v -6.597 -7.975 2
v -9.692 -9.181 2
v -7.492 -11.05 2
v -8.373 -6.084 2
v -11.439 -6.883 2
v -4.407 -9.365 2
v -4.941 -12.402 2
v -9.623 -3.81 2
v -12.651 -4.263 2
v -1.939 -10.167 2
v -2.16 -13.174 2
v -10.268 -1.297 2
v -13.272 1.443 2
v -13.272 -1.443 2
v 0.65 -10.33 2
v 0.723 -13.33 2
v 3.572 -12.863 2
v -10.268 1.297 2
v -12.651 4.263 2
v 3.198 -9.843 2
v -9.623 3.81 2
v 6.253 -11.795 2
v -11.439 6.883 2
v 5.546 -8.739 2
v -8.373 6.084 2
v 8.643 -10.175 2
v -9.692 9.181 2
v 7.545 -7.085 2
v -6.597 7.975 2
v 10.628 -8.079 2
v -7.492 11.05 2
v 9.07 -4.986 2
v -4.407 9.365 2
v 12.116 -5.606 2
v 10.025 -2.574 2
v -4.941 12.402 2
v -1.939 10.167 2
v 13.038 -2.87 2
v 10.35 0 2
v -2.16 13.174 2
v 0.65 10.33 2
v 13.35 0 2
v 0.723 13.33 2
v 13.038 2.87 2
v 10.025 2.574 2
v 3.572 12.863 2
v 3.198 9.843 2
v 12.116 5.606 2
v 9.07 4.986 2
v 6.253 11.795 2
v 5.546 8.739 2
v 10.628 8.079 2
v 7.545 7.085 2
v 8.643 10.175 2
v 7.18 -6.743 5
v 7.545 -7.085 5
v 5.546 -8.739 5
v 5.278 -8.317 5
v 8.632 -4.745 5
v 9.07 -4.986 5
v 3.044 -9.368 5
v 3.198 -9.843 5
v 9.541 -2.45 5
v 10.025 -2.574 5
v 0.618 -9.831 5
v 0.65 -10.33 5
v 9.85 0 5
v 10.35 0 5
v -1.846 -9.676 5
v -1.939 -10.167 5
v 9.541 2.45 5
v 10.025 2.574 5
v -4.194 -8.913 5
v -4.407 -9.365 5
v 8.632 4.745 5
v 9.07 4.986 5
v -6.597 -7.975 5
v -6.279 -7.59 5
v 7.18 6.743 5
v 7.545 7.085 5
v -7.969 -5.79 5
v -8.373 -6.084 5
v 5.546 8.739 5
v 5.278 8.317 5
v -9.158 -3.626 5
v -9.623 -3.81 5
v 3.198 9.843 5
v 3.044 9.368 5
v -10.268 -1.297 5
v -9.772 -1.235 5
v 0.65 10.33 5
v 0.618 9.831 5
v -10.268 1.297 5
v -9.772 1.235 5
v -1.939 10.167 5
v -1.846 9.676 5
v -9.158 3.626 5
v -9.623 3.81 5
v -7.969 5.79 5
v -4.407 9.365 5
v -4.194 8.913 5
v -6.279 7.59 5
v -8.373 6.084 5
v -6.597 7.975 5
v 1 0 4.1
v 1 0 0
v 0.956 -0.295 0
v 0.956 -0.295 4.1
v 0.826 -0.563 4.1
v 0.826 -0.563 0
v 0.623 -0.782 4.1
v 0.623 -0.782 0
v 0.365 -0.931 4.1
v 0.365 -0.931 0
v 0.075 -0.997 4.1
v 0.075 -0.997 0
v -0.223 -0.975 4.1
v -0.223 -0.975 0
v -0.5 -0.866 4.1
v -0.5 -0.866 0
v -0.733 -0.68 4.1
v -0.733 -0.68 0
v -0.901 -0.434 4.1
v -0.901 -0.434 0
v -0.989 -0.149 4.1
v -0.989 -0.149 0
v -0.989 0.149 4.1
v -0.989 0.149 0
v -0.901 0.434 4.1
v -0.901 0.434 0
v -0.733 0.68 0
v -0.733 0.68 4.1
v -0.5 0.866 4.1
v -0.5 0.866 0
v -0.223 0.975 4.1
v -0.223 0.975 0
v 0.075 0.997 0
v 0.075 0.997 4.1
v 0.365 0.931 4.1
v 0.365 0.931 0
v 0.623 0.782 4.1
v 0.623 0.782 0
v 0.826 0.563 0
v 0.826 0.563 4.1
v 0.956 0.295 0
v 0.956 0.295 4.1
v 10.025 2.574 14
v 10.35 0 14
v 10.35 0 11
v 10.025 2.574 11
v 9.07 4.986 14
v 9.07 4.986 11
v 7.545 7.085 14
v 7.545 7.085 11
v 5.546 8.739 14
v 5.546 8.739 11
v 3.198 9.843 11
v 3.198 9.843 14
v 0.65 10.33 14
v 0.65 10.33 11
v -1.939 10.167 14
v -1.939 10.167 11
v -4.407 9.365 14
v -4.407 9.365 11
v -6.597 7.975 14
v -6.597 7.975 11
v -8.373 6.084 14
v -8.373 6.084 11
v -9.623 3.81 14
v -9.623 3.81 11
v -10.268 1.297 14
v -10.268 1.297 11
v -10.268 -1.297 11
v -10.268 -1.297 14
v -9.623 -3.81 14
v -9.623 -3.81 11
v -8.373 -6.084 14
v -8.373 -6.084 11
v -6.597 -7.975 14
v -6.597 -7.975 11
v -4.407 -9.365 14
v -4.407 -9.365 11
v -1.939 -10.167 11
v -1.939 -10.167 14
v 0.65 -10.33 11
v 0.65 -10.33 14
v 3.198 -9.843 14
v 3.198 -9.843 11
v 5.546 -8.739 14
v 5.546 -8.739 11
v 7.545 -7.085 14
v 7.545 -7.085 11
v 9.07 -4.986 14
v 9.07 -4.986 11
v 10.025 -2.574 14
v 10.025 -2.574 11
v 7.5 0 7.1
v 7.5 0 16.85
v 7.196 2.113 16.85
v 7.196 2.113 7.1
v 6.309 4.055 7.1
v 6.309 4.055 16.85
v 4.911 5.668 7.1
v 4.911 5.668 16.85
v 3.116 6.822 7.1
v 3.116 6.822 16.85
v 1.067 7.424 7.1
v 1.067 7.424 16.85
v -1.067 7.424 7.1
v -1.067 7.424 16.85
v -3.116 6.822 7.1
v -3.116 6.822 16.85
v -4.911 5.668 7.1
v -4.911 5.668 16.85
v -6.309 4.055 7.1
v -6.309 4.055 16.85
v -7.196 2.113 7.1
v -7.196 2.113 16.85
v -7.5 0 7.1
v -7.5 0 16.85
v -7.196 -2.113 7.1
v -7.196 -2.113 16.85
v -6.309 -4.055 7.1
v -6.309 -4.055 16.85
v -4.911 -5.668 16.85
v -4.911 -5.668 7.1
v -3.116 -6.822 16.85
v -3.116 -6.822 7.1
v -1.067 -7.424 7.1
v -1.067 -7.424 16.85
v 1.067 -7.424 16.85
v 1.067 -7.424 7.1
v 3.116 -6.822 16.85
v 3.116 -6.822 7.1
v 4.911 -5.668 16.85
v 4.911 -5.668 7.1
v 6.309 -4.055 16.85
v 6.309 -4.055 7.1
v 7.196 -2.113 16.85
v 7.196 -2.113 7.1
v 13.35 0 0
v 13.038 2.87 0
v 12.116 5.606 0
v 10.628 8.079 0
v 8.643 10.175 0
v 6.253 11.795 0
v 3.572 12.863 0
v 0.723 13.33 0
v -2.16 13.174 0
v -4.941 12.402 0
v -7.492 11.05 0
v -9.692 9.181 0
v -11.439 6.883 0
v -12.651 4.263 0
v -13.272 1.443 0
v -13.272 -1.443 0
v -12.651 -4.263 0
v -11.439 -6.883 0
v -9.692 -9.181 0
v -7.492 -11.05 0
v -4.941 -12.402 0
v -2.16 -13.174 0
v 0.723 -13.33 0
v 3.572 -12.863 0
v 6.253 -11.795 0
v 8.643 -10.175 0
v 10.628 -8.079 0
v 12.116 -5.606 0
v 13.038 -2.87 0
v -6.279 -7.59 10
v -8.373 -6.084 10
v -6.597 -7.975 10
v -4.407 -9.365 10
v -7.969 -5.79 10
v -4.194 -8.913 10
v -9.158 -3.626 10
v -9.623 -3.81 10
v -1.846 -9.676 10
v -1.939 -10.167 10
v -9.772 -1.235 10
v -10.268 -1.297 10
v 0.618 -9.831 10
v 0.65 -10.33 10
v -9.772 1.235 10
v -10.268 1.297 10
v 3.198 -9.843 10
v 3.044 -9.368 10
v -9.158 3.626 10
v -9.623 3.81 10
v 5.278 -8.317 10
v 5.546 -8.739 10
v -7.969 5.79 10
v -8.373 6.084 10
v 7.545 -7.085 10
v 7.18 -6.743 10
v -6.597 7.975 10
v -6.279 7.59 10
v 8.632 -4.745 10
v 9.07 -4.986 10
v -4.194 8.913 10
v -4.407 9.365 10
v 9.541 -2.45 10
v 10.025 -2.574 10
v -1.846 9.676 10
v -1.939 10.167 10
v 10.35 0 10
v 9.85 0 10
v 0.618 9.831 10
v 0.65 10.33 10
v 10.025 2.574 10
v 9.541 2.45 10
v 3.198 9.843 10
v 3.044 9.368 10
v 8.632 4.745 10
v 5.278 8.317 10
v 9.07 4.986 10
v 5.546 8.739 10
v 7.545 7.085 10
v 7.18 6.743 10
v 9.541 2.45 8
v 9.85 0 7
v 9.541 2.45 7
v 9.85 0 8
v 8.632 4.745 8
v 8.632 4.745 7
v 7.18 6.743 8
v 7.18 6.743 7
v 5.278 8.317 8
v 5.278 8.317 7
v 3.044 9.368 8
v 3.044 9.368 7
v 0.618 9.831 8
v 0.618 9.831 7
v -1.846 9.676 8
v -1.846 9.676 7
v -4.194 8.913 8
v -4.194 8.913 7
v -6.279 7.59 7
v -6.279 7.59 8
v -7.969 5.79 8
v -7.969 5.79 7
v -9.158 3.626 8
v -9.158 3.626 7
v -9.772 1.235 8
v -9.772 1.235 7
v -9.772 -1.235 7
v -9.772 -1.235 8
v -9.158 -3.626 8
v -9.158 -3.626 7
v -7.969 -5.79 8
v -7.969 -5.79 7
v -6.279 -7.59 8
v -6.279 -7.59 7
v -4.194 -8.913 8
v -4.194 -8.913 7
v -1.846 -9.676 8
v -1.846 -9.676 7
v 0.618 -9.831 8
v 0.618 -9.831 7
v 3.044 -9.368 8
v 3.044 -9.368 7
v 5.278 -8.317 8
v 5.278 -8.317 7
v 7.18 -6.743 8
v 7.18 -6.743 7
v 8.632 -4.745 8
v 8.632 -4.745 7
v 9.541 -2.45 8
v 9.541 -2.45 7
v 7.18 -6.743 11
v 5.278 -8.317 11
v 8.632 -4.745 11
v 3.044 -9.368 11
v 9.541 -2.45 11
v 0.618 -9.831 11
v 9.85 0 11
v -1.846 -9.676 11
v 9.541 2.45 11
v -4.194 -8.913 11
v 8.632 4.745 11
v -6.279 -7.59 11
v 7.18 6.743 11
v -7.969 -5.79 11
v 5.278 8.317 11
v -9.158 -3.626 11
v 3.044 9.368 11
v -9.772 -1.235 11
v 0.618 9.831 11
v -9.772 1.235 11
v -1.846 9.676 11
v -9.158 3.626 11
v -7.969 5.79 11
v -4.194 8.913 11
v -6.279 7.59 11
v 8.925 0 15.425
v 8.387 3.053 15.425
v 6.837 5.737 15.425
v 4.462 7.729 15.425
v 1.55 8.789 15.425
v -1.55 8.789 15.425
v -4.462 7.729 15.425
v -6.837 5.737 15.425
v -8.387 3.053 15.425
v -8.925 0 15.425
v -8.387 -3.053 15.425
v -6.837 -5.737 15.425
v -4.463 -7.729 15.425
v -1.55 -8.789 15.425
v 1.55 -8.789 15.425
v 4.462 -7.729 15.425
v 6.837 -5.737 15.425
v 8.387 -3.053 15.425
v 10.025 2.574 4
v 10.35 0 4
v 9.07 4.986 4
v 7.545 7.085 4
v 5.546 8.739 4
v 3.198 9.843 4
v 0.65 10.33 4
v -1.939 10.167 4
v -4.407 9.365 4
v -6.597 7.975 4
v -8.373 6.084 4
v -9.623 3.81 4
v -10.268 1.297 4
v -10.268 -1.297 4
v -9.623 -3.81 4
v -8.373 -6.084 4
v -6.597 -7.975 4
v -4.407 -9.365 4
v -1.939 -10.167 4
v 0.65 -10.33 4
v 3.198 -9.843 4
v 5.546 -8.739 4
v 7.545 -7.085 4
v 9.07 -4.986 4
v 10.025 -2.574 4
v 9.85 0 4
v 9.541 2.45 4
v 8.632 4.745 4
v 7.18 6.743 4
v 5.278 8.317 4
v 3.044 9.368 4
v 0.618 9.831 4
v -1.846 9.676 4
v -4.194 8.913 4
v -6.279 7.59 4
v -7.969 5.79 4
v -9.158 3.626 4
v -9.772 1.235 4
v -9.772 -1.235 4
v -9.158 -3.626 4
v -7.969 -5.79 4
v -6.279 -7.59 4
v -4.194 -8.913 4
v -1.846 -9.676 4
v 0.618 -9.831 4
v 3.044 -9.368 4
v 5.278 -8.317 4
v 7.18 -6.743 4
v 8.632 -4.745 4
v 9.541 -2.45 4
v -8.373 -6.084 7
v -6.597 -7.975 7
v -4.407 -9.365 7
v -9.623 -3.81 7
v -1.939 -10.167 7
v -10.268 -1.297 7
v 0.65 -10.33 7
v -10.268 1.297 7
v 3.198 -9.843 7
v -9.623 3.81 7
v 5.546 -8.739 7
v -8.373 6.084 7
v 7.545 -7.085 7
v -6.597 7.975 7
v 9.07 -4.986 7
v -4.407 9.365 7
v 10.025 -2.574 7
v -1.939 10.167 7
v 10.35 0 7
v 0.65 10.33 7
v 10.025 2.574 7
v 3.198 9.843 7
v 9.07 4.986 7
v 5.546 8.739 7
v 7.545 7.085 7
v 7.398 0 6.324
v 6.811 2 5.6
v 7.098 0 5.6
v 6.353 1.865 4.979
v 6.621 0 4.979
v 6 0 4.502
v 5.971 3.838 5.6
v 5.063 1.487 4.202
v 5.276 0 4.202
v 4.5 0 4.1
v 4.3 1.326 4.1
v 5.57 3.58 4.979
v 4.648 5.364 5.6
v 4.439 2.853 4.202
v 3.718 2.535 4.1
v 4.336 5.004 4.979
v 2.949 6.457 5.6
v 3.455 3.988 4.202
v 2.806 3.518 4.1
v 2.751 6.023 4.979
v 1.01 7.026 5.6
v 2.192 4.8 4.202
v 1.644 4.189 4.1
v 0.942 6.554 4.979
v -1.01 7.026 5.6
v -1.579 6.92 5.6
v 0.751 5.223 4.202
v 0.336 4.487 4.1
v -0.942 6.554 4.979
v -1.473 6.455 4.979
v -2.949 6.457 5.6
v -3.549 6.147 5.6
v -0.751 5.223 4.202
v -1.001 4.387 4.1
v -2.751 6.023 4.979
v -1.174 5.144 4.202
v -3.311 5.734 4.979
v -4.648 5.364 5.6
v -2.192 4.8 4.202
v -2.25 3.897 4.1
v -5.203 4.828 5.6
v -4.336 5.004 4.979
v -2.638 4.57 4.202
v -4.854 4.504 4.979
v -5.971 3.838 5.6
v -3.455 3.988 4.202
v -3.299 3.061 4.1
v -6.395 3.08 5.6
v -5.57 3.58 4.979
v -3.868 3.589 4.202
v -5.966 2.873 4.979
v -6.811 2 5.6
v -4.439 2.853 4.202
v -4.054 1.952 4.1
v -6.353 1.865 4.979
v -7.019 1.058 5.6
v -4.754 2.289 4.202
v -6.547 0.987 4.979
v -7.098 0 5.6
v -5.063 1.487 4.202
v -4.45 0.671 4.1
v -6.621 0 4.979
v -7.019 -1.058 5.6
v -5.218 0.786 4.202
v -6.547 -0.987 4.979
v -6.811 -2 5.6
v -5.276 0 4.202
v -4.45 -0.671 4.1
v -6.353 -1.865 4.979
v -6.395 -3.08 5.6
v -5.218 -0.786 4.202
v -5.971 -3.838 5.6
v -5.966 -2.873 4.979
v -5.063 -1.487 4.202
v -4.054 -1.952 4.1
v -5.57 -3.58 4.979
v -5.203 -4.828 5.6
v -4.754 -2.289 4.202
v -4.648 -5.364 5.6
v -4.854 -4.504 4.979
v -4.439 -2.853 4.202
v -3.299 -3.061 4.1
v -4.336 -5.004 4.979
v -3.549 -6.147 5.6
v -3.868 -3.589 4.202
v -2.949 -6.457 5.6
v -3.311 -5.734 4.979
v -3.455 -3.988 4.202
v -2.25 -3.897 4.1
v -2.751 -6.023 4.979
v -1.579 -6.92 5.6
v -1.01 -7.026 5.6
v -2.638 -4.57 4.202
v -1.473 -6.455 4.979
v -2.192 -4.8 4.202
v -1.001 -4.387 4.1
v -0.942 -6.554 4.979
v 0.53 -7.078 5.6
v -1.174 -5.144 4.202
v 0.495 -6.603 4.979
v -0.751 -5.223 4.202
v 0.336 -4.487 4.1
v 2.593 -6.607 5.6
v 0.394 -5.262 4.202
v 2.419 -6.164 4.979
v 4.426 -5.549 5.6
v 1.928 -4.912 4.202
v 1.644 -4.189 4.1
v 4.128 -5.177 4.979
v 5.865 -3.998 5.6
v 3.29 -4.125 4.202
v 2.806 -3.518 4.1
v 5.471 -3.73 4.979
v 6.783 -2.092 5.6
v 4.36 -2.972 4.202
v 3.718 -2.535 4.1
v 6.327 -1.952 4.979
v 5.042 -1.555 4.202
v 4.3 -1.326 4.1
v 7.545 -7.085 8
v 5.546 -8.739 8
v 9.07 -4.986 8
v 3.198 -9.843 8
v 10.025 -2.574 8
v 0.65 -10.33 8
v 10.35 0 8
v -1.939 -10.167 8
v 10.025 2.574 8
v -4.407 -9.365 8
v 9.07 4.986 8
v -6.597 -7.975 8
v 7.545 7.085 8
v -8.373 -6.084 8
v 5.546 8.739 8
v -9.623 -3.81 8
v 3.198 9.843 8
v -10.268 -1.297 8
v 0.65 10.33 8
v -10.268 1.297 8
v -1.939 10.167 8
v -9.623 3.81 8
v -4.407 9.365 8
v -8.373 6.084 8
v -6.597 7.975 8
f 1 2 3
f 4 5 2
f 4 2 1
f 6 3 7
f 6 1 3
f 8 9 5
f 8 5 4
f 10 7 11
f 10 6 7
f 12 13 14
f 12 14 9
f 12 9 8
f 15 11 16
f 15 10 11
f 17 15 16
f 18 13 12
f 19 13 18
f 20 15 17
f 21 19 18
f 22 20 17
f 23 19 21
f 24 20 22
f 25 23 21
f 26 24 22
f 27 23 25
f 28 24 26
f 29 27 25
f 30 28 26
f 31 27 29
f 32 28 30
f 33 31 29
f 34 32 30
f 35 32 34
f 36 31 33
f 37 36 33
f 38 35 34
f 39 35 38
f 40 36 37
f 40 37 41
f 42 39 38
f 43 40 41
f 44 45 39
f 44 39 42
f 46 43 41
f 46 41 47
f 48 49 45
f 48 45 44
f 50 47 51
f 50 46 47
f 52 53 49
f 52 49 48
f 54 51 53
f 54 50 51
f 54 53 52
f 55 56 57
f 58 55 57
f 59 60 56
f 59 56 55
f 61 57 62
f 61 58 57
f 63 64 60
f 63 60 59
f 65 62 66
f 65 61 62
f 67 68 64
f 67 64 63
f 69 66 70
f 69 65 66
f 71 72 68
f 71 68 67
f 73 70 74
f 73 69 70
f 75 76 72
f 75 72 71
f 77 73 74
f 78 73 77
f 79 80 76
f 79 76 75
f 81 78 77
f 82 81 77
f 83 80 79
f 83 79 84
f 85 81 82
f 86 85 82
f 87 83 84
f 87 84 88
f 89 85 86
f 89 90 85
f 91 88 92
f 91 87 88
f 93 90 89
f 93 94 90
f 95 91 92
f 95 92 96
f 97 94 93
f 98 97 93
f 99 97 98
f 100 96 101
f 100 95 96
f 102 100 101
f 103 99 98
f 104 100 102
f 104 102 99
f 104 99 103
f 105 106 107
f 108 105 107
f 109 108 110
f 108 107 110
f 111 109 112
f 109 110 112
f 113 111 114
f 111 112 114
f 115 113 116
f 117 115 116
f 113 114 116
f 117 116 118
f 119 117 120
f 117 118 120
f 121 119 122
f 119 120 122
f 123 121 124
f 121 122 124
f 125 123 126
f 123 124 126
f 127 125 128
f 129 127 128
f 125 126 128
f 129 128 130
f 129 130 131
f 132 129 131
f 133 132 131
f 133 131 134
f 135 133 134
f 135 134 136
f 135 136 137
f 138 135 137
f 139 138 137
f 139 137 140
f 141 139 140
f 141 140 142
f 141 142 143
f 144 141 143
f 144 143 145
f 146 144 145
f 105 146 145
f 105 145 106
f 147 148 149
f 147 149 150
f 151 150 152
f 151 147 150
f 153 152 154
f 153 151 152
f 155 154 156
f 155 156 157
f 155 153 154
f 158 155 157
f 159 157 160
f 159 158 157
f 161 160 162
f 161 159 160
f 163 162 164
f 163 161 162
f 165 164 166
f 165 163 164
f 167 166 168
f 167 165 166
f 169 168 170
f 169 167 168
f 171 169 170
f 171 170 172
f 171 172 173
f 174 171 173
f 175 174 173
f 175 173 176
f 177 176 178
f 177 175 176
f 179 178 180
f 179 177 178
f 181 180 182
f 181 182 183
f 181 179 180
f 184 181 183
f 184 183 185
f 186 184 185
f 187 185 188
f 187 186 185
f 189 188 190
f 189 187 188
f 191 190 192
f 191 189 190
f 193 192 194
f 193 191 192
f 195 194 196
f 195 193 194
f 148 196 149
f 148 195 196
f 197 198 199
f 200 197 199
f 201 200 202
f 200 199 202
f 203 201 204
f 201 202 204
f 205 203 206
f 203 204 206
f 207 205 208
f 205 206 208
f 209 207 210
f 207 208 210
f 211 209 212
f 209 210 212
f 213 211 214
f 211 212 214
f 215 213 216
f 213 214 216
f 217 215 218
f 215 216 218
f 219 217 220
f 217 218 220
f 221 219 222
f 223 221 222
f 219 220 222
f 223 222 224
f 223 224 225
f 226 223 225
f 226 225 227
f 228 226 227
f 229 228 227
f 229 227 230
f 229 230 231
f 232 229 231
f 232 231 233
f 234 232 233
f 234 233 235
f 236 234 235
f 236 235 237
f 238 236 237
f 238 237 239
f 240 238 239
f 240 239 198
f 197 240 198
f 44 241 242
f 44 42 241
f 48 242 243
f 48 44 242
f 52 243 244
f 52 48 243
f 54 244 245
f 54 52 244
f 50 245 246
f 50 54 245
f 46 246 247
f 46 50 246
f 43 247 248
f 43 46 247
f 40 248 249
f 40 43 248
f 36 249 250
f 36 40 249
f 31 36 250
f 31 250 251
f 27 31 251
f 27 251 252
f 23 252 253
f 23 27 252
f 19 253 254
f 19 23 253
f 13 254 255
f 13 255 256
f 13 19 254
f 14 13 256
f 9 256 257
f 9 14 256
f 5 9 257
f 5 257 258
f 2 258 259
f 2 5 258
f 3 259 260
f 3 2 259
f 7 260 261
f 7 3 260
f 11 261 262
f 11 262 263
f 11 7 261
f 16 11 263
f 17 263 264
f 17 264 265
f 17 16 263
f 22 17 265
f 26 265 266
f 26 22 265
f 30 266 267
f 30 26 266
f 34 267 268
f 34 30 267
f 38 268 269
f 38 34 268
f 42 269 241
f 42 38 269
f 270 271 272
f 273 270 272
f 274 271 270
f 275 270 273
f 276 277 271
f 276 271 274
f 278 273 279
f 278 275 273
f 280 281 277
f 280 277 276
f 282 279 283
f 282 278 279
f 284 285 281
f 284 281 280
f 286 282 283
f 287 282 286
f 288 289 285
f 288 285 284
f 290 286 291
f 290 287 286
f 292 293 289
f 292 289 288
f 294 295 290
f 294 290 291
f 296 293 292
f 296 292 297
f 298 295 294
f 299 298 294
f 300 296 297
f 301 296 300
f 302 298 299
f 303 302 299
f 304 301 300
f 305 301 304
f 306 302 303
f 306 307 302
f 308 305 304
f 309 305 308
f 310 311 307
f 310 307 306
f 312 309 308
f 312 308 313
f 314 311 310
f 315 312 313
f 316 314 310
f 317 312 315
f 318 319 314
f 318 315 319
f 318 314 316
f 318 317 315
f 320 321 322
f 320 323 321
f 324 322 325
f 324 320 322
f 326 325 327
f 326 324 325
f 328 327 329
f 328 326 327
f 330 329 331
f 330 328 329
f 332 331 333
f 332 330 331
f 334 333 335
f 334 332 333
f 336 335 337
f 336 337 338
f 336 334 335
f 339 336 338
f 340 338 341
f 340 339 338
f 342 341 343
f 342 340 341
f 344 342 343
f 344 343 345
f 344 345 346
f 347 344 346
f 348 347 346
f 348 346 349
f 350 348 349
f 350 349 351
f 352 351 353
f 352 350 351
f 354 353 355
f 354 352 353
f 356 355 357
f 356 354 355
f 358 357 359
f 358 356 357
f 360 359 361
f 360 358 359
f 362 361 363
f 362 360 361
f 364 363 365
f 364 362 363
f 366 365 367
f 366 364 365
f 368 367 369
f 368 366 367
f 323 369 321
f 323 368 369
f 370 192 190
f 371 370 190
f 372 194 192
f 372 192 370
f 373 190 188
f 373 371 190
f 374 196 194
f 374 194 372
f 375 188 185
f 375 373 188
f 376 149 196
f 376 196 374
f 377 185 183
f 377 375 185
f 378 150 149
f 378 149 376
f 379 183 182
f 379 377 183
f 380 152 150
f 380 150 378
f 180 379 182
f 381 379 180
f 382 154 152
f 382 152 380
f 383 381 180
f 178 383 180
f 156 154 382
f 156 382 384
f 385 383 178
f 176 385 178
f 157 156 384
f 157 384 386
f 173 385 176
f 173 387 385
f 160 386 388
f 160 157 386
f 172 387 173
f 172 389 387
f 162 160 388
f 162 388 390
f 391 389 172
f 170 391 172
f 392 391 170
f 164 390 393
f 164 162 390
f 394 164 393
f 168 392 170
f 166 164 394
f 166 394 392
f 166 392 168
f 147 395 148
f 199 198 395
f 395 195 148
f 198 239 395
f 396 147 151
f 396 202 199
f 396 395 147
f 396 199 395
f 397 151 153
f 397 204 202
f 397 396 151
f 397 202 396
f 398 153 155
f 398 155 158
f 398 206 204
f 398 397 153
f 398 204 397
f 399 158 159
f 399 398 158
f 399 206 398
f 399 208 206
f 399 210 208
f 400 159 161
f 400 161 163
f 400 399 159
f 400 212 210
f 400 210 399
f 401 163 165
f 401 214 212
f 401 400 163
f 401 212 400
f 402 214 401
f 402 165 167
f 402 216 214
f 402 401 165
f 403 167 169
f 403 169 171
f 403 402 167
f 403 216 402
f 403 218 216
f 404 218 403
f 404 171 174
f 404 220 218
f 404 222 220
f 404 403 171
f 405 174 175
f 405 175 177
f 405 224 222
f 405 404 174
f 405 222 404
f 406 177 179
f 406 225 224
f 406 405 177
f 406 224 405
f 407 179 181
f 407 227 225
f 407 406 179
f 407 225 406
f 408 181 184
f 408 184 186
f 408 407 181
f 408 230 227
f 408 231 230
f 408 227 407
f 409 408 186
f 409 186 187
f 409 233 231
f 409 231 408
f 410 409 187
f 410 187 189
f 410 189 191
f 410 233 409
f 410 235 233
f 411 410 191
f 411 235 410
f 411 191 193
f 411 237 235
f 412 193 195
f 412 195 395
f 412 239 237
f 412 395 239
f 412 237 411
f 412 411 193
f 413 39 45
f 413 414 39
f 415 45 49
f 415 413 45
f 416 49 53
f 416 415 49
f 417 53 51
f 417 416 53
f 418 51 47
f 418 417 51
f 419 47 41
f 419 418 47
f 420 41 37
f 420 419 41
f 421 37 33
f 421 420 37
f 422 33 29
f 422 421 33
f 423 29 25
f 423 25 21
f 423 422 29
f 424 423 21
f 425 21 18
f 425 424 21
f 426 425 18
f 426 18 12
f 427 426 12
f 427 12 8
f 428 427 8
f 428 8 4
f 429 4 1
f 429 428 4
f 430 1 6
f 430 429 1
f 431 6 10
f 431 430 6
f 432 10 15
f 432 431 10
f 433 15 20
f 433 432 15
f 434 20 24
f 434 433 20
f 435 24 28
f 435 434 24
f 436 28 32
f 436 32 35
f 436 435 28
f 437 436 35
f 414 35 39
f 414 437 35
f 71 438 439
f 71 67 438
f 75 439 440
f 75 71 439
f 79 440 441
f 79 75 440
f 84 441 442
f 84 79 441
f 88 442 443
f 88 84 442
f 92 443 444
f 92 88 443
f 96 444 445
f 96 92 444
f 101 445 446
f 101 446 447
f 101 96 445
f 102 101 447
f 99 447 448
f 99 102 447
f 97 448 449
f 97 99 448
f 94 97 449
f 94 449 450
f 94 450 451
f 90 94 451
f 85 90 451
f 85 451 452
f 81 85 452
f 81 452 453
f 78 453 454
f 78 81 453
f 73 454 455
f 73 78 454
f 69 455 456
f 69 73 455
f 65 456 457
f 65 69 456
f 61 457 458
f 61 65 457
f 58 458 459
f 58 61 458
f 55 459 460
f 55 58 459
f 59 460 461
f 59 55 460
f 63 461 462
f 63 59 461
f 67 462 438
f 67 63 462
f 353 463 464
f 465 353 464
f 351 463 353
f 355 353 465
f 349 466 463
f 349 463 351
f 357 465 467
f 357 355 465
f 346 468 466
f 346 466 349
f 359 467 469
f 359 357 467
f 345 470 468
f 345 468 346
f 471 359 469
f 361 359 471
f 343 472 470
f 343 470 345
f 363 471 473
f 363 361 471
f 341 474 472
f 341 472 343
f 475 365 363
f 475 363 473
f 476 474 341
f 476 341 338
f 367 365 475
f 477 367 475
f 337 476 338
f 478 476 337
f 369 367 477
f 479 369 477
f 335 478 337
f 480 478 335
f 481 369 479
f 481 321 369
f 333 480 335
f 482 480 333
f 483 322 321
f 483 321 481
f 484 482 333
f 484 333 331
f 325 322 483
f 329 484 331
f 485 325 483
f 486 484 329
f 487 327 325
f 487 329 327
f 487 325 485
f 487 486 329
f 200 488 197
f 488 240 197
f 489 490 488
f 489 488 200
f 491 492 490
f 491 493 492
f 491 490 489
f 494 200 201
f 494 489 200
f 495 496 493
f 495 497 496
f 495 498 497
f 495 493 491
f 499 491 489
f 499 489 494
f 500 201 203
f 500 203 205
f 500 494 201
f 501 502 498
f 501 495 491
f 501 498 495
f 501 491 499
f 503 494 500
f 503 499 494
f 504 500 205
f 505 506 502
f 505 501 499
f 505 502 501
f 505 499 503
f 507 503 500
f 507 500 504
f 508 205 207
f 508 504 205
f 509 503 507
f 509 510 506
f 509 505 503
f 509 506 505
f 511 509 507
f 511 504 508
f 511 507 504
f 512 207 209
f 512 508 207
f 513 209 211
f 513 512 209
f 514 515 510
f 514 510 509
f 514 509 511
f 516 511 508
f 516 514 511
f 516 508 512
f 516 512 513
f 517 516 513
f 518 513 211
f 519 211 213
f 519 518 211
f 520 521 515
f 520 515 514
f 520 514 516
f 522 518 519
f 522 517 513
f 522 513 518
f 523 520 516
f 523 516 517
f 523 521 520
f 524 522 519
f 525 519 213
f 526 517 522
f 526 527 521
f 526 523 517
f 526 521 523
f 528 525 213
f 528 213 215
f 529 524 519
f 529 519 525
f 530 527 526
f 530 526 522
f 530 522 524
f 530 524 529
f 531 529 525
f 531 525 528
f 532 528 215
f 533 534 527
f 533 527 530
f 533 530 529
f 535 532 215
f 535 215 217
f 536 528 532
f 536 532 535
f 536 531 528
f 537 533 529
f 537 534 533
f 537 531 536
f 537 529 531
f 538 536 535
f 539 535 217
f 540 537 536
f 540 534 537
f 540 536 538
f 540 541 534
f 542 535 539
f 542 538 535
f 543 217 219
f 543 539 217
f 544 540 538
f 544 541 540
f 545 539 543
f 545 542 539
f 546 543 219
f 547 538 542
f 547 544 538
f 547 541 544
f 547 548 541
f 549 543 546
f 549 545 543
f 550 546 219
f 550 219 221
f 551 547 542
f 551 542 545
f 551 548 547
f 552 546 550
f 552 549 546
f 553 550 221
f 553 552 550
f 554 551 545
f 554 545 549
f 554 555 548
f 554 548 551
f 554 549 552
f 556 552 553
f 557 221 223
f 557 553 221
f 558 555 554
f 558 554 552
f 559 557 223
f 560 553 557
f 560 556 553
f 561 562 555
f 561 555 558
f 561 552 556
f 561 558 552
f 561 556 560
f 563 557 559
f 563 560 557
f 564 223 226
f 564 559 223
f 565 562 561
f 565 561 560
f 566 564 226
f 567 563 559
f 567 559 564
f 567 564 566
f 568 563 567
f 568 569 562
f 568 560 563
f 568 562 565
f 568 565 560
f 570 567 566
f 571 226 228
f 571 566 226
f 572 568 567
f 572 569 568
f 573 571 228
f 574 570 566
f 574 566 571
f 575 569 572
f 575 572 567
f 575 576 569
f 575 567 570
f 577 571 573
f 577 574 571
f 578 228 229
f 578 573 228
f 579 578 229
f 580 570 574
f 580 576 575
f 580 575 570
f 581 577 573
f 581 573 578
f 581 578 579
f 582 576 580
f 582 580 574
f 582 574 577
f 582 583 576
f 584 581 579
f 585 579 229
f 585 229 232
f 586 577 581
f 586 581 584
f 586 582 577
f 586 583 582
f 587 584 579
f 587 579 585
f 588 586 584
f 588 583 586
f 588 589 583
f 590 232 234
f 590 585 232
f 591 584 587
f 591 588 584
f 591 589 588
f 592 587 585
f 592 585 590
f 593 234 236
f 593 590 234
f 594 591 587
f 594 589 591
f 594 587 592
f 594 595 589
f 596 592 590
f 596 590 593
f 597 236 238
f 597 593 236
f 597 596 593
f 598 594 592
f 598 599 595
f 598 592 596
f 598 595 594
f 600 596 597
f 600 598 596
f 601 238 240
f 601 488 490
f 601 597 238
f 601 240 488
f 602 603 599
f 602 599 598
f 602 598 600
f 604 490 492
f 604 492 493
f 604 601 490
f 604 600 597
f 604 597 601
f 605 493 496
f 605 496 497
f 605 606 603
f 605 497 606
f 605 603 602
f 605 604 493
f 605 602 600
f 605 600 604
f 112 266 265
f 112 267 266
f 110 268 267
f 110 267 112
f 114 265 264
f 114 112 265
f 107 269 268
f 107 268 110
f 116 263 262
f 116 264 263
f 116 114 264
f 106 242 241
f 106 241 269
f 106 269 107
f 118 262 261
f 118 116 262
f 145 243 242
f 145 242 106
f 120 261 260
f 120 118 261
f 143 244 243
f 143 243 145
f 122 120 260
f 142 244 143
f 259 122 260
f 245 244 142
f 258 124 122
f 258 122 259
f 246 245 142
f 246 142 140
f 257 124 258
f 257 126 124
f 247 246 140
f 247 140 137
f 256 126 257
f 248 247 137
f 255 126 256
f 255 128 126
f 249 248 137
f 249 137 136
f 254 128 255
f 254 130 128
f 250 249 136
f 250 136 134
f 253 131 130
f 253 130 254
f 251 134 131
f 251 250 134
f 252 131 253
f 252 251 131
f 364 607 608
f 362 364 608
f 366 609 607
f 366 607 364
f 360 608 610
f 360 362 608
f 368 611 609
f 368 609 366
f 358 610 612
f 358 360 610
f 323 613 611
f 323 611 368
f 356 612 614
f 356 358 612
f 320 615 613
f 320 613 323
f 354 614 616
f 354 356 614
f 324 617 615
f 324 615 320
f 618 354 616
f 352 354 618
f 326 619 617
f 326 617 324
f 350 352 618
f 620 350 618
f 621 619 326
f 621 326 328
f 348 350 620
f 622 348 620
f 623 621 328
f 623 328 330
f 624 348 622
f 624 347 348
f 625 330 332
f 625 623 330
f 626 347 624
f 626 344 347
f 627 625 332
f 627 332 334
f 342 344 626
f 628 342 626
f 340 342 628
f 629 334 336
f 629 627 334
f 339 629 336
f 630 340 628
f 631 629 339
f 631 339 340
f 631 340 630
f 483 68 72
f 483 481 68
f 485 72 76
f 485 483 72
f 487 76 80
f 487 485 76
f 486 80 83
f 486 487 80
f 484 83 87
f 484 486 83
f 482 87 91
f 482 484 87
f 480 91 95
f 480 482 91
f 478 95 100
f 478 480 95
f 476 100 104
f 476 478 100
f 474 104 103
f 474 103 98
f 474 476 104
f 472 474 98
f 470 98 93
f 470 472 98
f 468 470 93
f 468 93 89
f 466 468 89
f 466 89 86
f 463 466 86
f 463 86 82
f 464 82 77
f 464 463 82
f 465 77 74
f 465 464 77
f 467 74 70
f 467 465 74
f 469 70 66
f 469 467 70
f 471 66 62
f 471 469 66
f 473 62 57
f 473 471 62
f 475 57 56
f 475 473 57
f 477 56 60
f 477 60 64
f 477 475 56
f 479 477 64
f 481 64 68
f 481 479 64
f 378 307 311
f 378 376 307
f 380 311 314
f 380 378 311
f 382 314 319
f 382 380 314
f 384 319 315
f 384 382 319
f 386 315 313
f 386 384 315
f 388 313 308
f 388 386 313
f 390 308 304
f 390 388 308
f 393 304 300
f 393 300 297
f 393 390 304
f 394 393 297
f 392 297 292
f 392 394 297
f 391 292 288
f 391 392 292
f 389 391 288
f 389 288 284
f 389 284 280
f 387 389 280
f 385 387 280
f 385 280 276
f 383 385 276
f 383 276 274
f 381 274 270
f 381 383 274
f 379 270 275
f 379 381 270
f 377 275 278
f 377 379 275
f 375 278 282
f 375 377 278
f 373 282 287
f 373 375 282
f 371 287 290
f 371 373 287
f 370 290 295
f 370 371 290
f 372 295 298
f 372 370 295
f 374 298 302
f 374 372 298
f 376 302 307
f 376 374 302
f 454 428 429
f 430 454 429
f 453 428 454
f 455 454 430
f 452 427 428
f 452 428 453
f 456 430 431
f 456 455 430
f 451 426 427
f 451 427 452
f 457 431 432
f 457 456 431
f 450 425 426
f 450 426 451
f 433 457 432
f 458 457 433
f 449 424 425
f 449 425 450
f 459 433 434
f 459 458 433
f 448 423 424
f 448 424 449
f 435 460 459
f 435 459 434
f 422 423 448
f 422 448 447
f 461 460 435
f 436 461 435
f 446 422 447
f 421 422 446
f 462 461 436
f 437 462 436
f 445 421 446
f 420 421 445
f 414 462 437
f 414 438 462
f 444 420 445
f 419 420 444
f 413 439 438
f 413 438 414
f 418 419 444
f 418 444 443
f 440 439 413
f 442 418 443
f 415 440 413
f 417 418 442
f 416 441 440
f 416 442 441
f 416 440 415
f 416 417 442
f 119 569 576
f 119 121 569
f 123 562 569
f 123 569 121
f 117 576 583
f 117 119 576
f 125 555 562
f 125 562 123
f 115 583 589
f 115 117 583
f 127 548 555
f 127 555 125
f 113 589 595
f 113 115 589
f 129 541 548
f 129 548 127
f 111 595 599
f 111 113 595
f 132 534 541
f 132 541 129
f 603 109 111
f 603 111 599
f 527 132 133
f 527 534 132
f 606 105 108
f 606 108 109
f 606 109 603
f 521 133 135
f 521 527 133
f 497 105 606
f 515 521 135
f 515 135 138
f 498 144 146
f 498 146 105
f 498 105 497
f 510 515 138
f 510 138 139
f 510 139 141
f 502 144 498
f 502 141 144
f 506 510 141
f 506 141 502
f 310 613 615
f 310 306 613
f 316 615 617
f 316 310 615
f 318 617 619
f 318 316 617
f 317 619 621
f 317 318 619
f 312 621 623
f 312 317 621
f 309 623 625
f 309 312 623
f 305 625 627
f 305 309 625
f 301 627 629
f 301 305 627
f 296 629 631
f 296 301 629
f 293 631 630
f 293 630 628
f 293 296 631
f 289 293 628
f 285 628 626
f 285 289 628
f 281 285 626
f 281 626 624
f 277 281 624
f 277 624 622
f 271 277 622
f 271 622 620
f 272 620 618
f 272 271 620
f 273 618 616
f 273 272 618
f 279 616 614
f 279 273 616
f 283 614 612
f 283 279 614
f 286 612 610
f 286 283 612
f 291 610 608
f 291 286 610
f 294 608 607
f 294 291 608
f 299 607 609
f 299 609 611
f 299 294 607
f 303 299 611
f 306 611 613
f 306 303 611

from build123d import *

# Parameters (mm, degrees)
F2_SIZE  = 3
F3_R     = 7.5
F4_DEPTH = 12.9
F5_R     = 3
F6_R     = 1
F7_DEPTH = 25


with BuildPart() as f1:
    # F0 (on Front) → F1 (revolve)
    with BuildSketch(Plane.XZ):
        Polygon((0, 17), (0, 0), (10.35, 0), (13.35, 0), (13.35, 2), (10.35, 2), (10.35, 4), (9.85, 4), (9.85, 5), (10.35, 5), (10.35, 7), (9.85, 7), (9.85, 8), (10.35, 8), (10.35, 10), (9.85, 10), (9.85, 11), (10.35, 11), (10.35, 17), align=None)
    revolve(axis=Axis((0, 0, 12.16054), (0, 0, 1)))

    # F2
    f2_edges = [f1.edges().sort_by_distance(p)[0] for p in [
        (-10.35, 0, 17),
    ]]
    chamfer(f2_edges, length=F2_SIZE)

    # F3 (on face) → F4 (cut)
    with BuildSketch(Plane.XY.offset(17)):
        Circle(F3_R)
    extrude(amount=-F4_DEPTH, mode=Mode.SUBTRACT)

    # F5
    f5_edges = [f1.edges().sort_by_distance(p)[0] for p in [
        (-7.5, 0, 4.1),
    ]]
    fillet(f5_edges, radius=F5_R)

    # F6 (on face) → F7 (cut)
    with BuildSketch(Plane(origin=(0, 0, 0), x_dir=(1, 0, 0), z_dir=(0, 0, -1))):
        Circle(F6_R)
    extrude(amount=-F7_DEPTH, mode=Mode.SUBTRACT)


solid = f1.part
